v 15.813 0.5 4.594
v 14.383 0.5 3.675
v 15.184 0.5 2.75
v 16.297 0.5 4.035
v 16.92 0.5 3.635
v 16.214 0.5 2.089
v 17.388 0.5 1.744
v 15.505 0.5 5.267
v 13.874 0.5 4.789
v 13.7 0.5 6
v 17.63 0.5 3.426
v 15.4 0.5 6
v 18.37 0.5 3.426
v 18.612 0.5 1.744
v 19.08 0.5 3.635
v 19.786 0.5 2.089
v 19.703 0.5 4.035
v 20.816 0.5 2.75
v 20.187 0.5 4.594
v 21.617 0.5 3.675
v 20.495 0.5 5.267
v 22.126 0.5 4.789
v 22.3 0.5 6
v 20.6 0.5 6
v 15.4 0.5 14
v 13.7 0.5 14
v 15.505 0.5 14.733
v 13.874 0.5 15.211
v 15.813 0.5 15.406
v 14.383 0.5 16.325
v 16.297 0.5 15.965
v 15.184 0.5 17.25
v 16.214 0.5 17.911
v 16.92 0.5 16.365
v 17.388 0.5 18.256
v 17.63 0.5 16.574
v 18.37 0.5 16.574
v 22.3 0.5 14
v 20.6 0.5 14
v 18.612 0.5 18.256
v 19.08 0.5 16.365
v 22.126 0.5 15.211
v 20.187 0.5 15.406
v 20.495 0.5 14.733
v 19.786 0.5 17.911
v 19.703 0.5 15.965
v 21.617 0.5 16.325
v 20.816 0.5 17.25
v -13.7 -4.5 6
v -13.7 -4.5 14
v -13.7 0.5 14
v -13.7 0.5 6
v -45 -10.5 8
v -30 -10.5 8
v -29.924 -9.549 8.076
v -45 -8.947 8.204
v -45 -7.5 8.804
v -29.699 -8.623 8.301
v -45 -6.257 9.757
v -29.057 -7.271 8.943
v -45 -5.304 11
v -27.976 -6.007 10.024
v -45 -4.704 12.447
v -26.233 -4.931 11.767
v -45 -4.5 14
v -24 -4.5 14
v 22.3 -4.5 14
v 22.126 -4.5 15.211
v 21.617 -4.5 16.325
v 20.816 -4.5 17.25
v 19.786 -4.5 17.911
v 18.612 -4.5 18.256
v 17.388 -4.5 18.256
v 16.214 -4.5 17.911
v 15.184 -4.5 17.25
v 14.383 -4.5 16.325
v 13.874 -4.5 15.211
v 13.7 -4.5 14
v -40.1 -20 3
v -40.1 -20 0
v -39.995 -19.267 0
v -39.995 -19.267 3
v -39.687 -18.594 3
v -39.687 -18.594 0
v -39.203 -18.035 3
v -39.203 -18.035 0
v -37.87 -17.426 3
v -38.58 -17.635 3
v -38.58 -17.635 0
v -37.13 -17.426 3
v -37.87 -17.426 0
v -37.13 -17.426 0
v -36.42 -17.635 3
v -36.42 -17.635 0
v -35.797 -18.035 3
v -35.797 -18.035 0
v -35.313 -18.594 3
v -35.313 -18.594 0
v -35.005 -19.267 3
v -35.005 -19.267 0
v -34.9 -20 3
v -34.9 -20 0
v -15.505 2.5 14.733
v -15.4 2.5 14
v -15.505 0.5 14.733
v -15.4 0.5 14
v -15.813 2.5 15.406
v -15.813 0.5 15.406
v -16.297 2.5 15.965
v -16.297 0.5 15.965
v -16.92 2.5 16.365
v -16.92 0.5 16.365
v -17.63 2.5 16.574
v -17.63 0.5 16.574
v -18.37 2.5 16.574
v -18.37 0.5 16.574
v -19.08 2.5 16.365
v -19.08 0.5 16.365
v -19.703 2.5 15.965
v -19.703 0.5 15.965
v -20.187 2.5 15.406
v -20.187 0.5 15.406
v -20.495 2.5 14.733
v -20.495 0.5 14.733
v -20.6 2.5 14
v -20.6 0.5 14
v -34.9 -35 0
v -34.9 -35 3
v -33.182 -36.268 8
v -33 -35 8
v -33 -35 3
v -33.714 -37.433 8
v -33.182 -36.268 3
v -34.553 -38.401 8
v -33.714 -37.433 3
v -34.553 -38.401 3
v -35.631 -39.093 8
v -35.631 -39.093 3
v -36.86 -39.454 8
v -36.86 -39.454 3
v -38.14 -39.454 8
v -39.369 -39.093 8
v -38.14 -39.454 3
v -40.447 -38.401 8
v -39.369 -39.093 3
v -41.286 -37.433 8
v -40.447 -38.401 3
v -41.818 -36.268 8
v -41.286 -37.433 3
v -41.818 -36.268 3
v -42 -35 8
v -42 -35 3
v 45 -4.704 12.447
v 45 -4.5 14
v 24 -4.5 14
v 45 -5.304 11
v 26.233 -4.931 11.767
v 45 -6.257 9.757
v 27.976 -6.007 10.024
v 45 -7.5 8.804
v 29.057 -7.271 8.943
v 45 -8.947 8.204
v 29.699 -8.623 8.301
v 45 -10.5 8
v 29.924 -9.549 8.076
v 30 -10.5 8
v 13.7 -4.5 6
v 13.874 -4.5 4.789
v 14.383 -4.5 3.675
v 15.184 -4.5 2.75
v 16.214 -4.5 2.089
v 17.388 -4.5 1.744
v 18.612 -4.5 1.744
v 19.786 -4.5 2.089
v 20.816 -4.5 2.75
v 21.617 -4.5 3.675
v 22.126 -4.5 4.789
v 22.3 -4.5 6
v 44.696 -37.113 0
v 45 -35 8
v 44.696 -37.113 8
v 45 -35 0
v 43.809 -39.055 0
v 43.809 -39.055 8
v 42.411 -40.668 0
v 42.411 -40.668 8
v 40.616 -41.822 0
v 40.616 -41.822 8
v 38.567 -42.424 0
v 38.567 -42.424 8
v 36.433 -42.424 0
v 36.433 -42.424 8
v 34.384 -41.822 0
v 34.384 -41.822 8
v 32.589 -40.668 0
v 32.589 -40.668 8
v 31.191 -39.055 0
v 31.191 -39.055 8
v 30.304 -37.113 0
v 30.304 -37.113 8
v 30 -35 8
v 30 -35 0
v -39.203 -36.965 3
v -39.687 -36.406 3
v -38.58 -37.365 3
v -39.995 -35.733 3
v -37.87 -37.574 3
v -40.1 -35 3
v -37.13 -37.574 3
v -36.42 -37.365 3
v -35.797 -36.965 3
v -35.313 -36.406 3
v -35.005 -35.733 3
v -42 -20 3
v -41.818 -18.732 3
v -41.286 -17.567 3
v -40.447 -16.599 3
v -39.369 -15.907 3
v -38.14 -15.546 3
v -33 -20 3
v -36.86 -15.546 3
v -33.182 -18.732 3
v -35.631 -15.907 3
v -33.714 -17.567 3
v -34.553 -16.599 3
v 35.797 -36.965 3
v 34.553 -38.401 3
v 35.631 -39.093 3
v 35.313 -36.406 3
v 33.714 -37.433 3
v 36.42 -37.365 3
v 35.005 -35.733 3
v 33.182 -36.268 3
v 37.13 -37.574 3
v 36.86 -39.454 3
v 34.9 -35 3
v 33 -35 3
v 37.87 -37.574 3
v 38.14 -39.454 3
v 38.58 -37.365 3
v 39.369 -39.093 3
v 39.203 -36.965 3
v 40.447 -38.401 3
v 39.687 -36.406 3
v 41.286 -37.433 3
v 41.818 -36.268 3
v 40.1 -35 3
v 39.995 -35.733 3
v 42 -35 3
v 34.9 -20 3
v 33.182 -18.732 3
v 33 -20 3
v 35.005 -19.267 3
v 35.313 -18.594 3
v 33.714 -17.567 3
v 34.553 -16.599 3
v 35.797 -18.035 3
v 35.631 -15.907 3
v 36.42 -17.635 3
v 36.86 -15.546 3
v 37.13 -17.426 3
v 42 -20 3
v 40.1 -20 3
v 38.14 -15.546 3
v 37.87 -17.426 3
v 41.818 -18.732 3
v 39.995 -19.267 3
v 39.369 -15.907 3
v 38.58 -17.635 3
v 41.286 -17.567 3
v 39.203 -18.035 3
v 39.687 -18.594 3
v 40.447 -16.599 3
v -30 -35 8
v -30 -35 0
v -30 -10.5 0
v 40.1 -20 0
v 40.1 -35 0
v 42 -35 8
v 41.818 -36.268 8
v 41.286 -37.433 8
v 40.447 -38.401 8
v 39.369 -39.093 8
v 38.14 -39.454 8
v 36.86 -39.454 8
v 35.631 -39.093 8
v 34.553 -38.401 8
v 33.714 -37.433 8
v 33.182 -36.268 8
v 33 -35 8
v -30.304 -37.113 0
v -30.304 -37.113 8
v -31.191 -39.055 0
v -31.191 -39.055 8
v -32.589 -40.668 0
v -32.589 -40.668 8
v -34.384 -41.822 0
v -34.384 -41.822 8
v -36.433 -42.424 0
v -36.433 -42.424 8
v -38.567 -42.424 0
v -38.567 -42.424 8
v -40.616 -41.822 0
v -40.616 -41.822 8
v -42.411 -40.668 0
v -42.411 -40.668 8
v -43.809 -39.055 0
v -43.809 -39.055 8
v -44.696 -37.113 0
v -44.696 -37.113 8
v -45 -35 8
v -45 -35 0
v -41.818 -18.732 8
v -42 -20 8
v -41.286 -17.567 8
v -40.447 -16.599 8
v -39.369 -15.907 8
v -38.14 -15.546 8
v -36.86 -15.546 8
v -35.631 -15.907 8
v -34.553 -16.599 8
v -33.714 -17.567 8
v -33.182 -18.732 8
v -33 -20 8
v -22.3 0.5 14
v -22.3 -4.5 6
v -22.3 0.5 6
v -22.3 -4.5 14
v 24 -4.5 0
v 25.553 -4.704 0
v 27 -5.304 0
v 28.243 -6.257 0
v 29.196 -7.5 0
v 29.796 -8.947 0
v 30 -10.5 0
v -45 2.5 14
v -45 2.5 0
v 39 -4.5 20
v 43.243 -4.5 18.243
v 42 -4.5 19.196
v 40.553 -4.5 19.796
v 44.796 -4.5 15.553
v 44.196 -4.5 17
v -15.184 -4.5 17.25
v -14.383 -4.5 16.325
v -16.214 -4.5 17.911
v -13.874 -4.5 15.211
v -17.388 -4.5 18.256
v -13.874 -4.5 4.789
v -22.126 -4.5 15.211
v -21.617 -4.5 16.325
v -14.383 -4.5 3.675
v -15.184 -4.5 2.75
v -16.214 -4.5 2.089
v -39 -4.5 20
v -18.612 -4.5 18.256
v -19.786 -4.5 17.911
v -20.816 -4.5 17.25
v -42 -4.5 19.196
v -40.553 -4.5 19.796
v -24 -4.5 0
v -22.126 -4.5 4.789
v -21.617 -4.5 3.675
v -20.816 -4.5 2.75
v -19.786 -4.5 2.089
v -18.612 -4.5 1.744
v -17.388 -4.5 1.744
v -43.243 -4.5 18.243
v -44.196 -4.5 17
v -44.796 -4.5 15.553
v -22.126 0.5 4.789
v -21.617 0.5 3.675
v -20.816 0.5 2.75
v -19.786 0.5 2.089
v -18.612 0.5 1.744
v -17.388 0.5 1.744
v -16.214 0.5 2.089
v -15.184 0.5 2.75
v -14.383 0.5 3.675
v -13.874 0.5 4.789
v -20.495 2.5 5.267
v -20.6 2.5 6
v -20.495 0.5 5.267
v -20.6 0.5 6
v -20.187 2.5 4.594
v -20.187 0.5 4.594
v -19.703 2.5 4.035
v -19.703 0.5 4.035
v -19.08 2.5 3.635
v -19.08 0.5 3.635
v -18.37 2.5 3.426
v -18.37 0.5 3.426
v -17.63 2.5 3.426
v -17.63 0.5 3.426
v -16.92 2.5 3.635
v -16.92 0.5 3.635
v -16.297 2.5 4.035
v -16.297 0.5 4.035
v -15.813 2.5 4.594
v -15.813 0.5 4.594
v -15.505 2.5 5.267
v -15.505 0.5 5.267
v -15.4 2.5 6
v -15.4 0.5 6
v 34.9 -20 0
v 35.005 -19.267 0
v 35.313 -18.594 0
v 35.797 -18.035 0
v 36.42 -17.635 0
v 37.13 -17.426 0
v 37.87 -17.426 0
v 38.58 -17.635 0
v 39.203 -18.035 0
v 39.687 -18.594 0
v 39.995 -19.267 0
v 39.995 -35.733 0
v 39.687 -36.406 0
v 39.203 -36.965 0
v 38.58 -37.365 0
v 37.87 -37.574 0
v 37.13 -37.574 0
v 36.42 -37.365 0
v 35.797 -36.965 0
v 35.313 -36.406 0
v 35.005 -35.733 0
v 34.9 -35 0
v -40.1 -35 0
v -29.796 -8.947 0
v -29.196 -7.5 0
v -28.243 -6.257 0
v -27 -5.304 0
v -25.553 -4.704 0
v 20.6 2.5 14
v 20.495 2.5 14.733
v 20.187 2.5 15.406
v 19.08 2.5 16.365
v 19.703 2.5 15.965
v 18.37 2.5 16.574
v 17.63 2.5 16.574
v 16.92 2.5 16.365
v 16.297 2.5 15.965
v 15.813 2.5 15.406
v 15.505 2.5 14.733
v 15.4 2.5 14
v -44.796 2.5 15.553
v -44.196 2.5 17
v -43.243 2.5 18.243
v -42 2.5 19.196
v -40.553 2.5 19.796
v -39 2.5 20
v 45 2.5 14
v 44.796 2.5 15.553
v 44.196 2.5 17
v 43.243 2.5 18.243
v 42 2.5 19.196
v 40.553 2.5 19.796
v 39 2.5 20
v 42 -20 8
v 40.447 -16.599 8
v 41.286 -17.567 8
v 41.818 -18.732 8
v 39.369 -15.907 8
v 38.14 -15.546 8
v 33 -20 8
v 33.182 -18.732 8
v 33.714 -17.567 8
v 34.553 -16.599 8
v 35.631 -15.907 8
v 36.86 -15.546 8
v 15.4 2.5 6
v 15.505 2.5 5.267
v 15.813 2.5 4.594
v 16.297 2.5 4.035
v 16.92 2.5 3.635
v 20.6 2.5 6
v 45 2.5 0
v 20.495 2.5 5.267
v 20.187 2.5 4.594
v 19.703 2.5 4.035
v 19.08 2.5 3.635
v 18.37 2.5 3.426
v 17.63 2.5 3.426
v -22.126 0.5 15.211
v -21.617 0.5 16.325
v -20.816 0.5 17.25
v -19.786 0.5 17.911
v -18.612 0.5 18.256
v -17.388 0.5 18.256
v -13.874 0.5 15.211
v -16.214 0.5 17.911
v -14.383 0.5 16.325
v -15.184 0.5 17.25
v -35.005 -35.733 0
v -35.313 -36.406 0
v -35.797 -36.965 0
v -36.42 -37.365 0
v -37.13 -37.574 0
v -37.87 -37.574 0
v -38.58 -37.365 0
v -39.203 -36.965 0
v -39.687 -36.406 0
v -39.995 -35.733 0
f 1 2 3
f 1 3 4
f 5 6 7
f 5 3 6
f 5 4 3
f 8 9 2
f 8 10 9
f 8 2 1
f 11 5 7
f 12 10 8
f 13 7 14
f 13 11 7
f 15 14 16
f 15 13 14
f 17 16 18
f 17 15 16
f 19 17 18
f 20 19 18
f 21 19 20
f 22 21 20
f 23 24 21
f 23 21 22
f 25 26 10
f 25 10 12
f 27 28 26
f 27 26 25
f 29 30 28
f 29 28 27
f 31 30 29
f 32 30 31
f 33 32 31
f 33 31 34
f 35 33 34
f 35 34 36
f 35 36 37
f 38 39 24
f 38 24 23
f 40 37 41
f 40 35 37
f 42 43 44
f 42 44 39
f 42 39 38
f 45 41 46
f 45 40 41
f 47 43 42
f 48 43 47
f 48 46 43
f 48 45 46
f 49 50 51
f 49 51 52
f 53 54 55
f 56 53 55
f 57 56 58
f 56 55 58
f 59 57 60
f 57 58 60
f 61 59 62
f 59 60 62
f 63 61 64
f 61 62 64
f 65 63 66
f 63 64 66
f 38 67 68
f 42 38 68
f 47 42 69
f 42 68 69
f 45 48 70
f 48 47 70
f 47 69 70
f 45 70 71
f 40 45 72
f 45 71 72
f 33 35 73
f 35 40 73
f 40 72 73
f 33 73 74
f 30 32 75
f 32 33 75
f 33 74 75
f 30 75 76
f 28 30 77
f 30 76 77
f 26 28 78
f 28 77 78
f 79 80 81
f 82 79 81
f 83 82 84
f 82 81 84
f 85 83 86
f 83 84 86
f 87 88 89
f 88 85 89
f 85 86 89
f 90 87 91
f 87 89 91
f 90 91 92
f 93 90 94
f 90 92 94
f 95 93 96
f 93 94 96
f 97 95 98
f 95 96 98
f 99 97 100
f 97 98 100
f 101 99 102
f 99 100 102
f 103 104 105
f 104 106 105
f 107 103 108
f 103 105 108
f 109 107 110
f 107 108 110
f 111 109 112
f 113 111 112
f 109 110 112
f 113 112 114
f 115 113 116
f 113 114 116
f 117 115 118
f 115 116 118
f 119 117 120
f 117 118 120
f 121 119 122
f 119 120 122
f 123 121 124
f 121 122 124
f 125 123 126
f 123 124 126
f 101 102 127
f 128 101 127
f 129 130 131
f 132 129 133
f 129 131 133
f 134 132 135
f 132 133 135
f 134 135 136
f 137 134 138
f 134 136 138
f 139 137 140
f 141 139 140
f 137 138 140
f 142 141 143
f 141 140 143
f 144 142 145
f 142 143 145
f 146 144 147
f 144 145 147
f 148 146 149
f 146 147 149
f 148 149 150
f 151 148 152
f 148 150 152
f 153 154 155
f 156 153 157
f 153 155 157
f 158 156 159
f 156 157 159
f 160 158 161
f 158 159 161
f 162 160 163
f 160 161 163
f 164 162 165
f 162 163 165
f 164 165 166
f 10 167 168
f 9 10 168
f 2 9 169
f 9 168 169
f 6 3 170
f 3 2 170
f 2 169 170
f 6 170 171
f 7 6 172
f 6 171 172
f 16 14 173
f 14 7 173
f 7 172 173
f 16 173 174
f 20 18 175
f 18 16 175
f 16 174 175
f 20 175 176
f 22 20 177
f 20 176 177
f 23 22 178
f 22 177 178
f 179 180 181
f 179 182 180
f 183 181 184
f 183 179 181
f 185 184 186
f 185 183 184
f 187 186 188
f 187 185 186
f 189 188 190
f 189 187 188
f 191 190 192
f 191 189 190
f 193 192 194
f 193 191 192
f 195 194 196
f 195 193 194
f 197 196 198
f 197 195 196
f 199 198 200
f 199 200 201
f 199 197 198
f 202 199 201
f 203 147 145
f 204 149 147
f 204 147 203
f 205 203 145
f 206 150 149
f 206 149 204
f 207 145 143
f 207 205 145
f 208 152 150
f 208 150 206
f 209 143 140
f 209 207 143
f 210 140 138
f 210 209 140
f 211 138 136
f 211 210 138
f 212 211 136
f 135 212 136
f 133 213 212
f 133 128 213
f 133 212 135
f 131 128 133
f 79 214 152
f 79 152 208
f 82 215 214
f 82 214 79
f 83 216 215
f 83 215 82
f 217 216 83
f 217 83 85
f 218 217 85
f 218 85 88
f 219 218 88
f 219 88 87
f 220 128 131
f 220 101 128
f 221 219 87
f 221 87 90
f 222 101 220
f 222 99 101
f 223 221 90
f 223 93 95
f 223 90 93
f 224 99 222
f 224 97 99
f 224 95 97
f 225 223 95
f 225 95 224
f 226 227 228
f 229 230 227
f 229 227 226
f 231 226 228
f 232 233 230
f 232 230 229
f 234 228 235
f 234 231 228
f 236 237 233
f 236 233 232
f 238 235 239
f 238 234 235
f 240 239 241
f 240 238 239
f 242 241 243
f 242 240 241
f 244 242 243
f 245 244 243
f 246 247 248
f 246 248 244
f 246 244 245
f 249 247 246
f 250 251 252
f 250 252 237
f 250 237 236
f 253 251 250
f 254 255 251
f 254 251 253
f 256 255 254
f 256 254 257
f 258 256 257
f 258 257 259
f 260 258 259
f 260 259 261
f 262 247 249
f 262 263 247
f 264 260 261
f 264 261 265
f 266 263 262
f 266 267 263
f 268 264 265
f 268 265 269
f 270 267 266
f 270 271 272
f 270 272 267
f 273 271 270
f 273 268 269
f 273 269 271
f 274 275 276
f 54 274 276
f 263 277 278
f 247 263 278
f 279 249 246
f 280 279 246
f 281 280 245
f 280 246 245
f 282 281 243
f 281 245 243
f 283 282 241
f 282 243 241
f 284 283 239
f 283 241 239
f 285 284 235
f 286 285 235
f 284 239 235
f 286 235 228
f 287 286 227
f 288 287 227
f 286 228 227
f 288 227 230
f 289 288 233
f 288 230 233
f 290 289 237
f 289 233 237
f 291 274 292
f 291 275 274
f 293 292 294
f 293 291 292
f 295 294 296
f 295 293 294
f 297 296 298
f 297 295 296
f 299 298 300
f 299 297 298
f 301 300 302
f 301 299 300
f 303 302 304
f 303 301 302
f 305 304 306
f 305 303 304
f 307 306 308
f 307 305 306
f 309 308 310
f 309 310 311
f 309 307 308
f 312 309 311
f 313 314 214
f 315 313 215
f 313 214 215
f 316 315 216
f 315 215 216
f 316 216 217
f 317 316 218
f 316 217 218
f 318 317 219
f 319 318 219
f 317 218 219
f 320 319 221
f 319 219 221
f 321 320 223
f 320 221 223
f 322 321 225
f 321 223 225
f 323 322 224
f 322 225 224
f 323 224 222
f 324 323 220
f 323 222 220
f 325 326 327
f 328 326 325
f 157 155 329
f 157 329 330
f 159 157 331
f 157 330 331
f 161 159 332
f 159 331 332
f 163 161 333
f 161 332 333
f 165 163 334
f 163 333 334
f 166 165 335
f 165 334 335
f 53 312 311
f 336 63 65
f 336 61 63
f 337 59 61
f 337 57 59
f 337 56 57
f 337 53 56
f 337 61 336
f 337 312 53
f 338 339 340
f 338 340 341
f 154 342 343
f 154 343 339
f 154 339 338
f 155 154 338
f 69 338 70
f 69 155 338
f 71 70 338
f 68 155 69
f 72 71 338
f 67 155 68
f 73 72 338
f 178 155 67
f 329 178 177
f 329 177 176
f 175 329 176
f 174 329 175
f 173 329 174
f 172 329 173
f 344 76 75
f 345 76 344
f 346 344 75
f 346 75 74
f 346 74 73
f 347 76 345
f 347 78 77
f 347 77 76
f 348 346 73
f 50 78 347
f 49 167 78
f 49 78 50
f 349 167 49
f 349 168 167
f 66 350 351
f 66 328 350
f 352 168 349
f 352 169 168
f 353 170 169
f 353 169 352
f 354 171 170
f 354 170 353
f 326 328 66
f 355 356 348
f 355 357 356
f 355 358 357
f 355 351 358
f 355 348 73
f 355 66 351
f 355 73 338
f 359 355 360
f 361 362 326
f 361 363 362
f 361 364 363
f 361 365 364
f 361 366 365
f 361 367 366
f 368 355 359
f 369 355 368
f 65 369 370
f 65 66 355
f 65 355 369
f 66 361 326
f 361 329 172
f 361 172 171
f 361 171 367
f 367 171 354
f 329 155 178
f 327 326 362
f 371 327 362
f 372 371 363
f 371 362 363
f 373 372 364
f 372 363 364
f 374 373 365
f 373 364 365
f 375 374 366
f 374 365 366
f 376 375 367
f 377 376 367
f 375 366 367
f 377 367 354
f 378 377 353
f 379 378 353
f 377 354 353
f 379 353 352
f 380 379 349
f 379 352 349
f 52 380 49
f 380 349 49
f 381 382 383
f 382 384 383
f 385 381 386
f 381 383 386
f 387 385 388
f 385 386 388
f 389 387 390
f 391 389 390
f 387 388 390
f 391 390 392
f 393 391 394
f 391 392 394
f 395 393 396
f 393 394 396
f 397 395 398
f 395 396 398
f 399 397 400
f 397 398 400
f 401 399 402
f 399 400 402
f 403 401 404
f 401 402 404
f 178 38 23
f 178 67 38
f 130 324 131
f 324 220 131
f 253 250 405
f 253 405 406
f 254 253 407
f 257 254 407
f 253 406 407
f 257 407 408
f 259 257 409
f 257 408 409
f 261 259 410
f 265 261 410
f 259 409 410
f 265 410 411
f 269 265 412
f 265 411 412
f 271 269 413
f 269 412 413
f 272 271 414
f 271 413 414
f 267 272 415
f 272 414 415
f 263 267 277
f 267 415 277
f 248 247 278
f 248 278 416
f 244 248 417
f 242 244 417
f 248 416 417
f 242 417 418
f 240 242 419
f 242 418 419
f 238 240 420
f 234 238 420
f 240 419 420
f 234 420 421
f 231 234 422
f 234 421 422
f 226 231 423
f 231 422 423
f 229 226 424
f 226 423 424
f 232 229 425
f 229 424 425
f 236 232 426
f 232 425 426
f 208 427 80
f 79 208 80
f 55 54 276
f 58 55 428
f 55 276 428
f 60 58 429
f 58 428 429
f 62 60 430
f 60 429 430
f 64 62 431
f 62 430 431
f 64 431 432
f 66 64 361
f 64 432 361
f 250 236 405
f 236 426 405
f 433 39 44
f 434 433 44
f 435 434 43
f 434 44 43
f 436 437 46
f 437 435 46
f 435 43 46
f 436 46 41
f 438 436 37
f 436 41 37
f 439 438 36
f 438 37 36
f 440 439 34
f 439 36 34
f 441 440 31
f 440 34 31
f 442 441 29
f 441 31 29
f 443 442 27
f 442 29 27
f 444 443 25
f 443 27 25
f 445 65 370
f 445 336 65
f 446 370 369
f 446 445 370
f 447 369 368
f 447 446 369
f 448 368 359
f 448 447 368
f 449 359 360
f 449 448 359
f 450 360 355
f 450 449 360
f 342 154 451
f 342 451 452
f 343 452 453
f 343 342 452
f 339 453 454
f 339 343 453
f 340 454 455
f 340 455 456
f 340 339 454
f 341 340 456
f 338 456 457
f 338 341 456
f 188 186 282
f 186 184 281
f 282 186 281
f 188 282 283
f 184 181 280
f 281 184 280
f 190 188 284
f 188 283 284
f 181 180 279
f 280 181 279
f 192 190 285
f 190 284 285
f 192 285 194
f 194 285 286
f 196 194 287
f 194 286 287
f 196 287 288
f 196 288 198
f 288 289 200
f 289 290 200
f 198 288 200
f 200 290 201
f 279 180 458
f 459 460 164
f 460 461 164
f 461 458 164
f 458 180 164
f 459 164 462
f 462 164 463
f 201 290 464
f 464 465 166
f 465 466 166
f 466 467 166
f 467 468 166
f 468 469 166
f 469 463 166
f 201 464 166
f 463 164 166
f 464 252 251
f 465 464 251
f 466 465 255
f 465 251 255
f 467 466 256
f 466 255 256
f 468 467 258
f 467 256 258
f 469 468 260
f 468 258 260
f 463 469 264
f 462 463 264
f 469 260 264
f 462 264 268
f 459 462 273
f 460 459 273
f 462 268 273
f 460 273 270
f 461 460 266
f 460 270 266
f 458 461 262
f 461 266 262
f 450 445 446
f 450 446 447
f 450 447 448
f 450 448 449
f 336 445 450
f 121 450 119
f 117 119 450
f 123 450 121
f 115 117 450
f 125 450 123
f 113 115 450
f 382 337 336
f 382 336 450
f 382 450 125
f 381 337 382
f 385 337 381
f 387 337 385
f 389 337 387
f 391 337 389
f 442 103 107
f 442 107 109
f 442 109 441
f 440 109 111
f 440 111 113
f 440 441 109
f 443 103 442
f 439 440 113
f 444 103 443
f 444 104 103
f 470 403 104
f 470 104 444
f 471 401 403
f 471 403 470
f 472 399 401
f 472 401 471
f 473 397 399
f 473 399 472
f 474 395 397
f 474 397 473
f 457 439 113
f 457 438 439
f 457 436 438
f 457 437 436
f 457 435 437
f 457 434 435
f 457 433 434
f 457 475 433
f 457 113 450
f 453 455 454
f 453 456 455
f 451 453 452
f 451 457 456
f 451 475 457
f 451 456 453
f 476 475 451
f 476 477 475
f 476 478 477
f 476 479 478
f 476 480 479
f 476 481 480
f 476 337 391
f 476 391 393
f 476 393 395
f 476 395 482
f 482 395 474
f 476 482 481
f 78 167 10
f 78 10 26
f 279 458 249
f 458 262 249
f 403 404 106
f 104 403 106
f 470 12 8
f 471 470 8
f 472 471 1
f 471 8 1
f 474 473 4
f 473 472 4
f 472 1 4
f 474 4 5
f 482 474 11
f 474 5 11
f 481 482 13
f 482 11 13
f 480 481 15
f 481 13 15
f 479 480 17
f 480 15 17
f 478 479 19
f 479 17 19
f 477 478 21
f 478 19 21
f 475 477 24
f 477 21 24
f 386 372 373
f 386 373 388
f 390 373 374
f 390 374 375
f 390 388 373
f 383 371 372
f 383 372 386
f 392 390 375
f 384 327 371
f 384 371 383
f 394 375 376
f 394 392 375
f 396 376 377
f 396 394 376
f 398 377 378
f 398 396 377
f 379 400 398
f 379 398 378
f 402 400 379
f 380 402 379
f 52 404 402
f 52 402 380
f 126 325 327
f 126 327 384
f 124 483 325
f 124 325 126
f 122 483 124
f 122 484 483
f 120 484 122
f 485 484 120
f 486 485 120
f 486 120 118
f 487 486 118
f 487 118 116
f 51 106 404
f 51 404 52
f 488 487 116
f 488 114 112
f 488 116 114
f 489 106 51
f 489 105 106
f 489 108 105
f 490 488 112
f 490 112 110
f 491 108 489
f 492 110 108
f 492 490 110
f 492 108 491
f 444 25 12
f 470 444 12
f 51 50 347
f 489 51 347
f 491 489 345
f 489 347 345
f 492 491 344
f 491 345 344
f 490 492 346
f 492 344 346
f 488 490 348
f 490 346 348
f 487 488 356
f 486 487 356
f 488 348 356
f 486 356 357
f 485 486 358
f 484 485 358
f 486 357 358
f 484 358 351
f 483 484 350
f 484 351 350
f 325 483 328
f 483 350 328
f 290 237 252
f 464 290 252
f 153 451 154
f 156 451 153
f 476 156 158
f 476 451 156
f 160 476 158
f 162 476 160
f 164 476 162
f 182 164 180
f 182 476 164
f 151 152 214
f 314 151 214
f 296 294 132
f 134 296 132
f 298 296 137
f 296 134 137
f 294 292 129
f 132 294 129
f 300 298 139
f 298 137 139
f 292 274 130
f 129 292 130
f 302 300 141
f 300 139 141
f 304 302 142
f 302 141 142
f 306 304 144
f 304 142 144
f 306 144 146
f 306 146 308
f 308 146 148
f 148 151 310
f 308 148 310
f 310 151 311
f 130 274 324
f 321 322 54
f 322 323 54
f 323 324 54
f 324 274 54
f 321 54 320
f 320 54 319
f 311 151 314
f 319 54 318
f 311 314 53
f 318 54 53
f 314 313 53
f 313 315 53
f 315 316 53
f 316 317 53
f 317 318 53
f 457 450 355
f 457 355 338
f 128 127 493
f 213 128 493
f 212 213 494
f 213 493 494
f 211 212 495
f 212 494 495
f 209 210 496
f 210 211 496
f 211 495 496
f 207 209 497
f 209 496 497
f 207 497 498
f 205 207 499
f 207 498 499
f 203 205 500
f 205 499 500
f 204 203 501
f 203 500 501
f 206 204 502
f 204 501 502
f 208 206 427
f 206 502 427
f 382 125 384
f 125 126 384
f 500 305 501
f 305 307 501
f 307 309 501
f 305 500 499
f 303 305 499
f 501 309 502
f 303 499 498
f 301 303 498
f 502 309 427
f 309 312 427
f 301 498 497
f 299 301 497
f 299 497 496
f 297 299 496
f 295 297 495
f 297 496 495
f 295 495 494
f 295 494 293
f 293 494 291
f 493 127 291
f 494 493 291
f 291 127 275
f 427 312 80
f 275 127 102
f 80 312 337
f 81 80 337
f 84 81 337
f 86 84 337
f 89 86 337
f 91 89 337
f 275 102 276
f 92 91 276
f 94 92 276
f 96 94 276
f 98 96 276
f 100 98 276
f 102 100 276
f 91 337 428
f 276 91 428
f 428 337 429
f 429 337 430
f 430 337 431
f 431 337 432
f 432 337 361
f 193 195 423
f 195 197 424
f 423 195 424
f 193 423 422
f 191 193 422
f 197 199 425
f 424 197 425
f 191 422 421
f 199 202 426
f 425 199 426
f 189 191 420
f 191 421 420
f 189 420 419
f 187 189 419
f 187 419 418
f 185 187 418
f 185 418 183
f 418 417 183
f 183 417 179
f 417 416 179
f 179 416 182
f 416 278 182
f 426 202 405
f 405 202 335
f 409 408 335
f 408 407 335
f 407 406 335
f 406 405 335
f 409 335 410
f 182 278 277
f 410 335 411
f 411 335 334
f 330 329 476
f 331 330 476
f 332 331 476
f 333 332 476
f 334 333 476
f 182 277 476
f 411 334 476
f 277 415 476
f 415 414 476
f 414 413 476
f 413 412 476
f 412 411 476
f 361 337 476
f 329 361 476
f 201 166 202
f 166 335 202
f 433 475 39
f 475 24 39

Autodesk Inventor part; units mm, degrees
ref_plane "YZ Plane" through (0, 0, 0) normal (1, 0, 0) x (0, 1, 0)
ref_plane "XZ Plane" through (0, 0, 0) normal (0, 1, 0) x (-1, 0, 0)
ref_plane "XY Plane" through (0, 0, 0) normal (0, 0, 1) x (1, 0, 0)
sketch "Skizze1" plane through (0, 0, 0) normal (0, 0, 1) x (1, 0, 0)
  line L0 (-45, 2.5) -> (45, 2.5)
  line L1 (45, 2.5) -> (45, -4.5)
  line L2 (45, -4.5) -> (-45, -4.5)
  line L3 (-45, -4.5) -> (-45, 2.5)
  point P0 (0, 0)
  dimension "d0" = 7
  dimension "d1" = 90
  dimension "d2" = 45
  dimension "d3" = 2.5
extrude "Extrusion1" add sketch "Skizze1" along normal blind 20
sketch "Skizze2" plane through (0, 0, 0) normal (0, 0, -1) x (-1, 0, 0)
  line L0 (-45, 2.5) -> (45, 2.5) projected
  line L1 (37.5, -42.5) -> (37.5, -42.5)
  line L2 (30, -35) -> (30, 2.5)
  line L3 (30, 2.5) -> (45, 2.5)
  line L4 (45, 2.5) -> (45, -35)
  line L5 (45, 2.5) -> (45, -4.5) projected
  arc A0 (30, -35) -> (37.5, -42.5) centre (37.5, -35) ccw
  arc A1 (37.5, -42.5) -> (45, -35) centre (37.5, -35) ccw
  line L6 (37.5, -35) -> (37.5, -20) construction
  line L7 (40.1, -35) -> (40.1, -20)
  line L8 (34.9, -20) -> (34.9, -35)
  arc A2 (34.9, -35) -> (40.1, -35) centre (37.5, -35) ccw
  arc A3 (40.1, -20) -> (34.9, -20) centre (37.5, -20) ccw
  point P0 (0, 0)
  point P1 (37.5, -27.5)
  dimension "d8" = 45
  dimension "d9" = 7.5
  dimension "d14" = 5.2
  dimension "d15" = 15
  dimension "d16" = 4.9
  dimension "d38" = 4.9
extrude "Extrusion2" add sketch "Skizze2" against normal blind 8
fillet "Rundung2" radius 6 2 edges at (-30, -4.5, 4) (-37.5, -4.5, 8)
sketch "Skizze3" plane through (0, 0, 8) normal (0, 0, 1) x (1, 0, 0)
  line L0 (-34.9, -20) -> (-34.9, -35) projected
  arc A0 (-34.9, -20) -> (-40.1, -20) centre (-37.5, -20) ccw projected
  line L1 (-40.1, -35) -> (-40.1, -20) projected
  arc A1 (-40.1, -35) -> (-34.9, -35) centre (-37.5, -35) ccw projected
  arc A2 (-33, -20) -> (-42, -20) centre (-37.5, -20) ccw
  line L2 (-33, -20) -> (-33, -35)
  arc A3 (-42, -35) -> (-33, -35) centre (-37.5, -35) ccw
  line L3 (-42, -35) -> (-42, -20)
  point P0 (0, 0)
  dimension "d20" = 9
extrude "Extrusion3" cut sketch "Skizze3" along normal blind 5 and the other way blind 5
mirror "Spiegeln1" about plane through (0, 0, 0) normal (1, 0, 0) of "Extrusion2", "Rundung2", "Extrusion3"
sketch "Skizze4" plane through (-24, -4.5, 0) normal (0, -1, 0) x (1, 0, 0)
  line L0 (6, 14) -> (6, 6) construction
  line L1 (3.4, 14) -> (3.4, 6)
  line L2 (8.6, 6) -> (8.6, 14)
  arc A0 (8.6, 14) -> (3.4, 14) centre (6, 14) ccw
  arc A1 (3.4, 6) -> (8.6, 6) centre (6, 6) ccw
  line L3 (0, 0) -> (48, 0) projected
  line L4 (-21, 20) -> (69, 20) projected
  point P0 (24, 0)
  point P1 (6, 10)
  point P2 (52, 0)
  point P3 (69, 0)
  point P4 (-15, 20)
  dimension "d26" = 5.2
  dimension "d27" = 8
  dimension "d29" = 6
  dimension "d30" = 18
  dimension "d39" = 6
extrude "Extrusion4" cut sketch "Skizze4" against normal up to surface (7 mm away)
sketch "Skizze5" plane through (-24, -4.5, 0) normal (0, -1, 0) x (1, 0, 0)
  arc A0 (8.6, 14) -> (3.4, 14) centre (6, 14) ccw projected
  line L0 (3.4, 6) -> (3.4, 14) projected
  line L1 (8.6, 14) -> (8.6, 6) projected
  arc A1 (3.4, 6) -> (8.6, 6) centre (6, 6) ccw projected
  arc A2 (10.3, 14) -> (1.7, 14) centre (6, 14) ccw
  line L2 (10.3, 14) -> (10.3, 6)
  arc A3 (1.7, 6) -> (10.3, 6) centre (6, 6) ccw
  line L3 (1.7, 6) -> (1.7, 14)
  point P0 (24, 0)
  dimension "d33" = 8.6
extrude "Extrusion5" cut sketch "Skizze5" against normal blind 5
mirror "Spiegeln2" about plane through (0, 0, 0) normal (1, 0, 0) of "Extrusion4", "Extrusion5"
fillet "Rundung7" radius 6 2 edges at (-45, -1, 20) (45, -1, 20)
properties part number "103.007.01_Einstellwinkel" material "Aluminium 6061"
